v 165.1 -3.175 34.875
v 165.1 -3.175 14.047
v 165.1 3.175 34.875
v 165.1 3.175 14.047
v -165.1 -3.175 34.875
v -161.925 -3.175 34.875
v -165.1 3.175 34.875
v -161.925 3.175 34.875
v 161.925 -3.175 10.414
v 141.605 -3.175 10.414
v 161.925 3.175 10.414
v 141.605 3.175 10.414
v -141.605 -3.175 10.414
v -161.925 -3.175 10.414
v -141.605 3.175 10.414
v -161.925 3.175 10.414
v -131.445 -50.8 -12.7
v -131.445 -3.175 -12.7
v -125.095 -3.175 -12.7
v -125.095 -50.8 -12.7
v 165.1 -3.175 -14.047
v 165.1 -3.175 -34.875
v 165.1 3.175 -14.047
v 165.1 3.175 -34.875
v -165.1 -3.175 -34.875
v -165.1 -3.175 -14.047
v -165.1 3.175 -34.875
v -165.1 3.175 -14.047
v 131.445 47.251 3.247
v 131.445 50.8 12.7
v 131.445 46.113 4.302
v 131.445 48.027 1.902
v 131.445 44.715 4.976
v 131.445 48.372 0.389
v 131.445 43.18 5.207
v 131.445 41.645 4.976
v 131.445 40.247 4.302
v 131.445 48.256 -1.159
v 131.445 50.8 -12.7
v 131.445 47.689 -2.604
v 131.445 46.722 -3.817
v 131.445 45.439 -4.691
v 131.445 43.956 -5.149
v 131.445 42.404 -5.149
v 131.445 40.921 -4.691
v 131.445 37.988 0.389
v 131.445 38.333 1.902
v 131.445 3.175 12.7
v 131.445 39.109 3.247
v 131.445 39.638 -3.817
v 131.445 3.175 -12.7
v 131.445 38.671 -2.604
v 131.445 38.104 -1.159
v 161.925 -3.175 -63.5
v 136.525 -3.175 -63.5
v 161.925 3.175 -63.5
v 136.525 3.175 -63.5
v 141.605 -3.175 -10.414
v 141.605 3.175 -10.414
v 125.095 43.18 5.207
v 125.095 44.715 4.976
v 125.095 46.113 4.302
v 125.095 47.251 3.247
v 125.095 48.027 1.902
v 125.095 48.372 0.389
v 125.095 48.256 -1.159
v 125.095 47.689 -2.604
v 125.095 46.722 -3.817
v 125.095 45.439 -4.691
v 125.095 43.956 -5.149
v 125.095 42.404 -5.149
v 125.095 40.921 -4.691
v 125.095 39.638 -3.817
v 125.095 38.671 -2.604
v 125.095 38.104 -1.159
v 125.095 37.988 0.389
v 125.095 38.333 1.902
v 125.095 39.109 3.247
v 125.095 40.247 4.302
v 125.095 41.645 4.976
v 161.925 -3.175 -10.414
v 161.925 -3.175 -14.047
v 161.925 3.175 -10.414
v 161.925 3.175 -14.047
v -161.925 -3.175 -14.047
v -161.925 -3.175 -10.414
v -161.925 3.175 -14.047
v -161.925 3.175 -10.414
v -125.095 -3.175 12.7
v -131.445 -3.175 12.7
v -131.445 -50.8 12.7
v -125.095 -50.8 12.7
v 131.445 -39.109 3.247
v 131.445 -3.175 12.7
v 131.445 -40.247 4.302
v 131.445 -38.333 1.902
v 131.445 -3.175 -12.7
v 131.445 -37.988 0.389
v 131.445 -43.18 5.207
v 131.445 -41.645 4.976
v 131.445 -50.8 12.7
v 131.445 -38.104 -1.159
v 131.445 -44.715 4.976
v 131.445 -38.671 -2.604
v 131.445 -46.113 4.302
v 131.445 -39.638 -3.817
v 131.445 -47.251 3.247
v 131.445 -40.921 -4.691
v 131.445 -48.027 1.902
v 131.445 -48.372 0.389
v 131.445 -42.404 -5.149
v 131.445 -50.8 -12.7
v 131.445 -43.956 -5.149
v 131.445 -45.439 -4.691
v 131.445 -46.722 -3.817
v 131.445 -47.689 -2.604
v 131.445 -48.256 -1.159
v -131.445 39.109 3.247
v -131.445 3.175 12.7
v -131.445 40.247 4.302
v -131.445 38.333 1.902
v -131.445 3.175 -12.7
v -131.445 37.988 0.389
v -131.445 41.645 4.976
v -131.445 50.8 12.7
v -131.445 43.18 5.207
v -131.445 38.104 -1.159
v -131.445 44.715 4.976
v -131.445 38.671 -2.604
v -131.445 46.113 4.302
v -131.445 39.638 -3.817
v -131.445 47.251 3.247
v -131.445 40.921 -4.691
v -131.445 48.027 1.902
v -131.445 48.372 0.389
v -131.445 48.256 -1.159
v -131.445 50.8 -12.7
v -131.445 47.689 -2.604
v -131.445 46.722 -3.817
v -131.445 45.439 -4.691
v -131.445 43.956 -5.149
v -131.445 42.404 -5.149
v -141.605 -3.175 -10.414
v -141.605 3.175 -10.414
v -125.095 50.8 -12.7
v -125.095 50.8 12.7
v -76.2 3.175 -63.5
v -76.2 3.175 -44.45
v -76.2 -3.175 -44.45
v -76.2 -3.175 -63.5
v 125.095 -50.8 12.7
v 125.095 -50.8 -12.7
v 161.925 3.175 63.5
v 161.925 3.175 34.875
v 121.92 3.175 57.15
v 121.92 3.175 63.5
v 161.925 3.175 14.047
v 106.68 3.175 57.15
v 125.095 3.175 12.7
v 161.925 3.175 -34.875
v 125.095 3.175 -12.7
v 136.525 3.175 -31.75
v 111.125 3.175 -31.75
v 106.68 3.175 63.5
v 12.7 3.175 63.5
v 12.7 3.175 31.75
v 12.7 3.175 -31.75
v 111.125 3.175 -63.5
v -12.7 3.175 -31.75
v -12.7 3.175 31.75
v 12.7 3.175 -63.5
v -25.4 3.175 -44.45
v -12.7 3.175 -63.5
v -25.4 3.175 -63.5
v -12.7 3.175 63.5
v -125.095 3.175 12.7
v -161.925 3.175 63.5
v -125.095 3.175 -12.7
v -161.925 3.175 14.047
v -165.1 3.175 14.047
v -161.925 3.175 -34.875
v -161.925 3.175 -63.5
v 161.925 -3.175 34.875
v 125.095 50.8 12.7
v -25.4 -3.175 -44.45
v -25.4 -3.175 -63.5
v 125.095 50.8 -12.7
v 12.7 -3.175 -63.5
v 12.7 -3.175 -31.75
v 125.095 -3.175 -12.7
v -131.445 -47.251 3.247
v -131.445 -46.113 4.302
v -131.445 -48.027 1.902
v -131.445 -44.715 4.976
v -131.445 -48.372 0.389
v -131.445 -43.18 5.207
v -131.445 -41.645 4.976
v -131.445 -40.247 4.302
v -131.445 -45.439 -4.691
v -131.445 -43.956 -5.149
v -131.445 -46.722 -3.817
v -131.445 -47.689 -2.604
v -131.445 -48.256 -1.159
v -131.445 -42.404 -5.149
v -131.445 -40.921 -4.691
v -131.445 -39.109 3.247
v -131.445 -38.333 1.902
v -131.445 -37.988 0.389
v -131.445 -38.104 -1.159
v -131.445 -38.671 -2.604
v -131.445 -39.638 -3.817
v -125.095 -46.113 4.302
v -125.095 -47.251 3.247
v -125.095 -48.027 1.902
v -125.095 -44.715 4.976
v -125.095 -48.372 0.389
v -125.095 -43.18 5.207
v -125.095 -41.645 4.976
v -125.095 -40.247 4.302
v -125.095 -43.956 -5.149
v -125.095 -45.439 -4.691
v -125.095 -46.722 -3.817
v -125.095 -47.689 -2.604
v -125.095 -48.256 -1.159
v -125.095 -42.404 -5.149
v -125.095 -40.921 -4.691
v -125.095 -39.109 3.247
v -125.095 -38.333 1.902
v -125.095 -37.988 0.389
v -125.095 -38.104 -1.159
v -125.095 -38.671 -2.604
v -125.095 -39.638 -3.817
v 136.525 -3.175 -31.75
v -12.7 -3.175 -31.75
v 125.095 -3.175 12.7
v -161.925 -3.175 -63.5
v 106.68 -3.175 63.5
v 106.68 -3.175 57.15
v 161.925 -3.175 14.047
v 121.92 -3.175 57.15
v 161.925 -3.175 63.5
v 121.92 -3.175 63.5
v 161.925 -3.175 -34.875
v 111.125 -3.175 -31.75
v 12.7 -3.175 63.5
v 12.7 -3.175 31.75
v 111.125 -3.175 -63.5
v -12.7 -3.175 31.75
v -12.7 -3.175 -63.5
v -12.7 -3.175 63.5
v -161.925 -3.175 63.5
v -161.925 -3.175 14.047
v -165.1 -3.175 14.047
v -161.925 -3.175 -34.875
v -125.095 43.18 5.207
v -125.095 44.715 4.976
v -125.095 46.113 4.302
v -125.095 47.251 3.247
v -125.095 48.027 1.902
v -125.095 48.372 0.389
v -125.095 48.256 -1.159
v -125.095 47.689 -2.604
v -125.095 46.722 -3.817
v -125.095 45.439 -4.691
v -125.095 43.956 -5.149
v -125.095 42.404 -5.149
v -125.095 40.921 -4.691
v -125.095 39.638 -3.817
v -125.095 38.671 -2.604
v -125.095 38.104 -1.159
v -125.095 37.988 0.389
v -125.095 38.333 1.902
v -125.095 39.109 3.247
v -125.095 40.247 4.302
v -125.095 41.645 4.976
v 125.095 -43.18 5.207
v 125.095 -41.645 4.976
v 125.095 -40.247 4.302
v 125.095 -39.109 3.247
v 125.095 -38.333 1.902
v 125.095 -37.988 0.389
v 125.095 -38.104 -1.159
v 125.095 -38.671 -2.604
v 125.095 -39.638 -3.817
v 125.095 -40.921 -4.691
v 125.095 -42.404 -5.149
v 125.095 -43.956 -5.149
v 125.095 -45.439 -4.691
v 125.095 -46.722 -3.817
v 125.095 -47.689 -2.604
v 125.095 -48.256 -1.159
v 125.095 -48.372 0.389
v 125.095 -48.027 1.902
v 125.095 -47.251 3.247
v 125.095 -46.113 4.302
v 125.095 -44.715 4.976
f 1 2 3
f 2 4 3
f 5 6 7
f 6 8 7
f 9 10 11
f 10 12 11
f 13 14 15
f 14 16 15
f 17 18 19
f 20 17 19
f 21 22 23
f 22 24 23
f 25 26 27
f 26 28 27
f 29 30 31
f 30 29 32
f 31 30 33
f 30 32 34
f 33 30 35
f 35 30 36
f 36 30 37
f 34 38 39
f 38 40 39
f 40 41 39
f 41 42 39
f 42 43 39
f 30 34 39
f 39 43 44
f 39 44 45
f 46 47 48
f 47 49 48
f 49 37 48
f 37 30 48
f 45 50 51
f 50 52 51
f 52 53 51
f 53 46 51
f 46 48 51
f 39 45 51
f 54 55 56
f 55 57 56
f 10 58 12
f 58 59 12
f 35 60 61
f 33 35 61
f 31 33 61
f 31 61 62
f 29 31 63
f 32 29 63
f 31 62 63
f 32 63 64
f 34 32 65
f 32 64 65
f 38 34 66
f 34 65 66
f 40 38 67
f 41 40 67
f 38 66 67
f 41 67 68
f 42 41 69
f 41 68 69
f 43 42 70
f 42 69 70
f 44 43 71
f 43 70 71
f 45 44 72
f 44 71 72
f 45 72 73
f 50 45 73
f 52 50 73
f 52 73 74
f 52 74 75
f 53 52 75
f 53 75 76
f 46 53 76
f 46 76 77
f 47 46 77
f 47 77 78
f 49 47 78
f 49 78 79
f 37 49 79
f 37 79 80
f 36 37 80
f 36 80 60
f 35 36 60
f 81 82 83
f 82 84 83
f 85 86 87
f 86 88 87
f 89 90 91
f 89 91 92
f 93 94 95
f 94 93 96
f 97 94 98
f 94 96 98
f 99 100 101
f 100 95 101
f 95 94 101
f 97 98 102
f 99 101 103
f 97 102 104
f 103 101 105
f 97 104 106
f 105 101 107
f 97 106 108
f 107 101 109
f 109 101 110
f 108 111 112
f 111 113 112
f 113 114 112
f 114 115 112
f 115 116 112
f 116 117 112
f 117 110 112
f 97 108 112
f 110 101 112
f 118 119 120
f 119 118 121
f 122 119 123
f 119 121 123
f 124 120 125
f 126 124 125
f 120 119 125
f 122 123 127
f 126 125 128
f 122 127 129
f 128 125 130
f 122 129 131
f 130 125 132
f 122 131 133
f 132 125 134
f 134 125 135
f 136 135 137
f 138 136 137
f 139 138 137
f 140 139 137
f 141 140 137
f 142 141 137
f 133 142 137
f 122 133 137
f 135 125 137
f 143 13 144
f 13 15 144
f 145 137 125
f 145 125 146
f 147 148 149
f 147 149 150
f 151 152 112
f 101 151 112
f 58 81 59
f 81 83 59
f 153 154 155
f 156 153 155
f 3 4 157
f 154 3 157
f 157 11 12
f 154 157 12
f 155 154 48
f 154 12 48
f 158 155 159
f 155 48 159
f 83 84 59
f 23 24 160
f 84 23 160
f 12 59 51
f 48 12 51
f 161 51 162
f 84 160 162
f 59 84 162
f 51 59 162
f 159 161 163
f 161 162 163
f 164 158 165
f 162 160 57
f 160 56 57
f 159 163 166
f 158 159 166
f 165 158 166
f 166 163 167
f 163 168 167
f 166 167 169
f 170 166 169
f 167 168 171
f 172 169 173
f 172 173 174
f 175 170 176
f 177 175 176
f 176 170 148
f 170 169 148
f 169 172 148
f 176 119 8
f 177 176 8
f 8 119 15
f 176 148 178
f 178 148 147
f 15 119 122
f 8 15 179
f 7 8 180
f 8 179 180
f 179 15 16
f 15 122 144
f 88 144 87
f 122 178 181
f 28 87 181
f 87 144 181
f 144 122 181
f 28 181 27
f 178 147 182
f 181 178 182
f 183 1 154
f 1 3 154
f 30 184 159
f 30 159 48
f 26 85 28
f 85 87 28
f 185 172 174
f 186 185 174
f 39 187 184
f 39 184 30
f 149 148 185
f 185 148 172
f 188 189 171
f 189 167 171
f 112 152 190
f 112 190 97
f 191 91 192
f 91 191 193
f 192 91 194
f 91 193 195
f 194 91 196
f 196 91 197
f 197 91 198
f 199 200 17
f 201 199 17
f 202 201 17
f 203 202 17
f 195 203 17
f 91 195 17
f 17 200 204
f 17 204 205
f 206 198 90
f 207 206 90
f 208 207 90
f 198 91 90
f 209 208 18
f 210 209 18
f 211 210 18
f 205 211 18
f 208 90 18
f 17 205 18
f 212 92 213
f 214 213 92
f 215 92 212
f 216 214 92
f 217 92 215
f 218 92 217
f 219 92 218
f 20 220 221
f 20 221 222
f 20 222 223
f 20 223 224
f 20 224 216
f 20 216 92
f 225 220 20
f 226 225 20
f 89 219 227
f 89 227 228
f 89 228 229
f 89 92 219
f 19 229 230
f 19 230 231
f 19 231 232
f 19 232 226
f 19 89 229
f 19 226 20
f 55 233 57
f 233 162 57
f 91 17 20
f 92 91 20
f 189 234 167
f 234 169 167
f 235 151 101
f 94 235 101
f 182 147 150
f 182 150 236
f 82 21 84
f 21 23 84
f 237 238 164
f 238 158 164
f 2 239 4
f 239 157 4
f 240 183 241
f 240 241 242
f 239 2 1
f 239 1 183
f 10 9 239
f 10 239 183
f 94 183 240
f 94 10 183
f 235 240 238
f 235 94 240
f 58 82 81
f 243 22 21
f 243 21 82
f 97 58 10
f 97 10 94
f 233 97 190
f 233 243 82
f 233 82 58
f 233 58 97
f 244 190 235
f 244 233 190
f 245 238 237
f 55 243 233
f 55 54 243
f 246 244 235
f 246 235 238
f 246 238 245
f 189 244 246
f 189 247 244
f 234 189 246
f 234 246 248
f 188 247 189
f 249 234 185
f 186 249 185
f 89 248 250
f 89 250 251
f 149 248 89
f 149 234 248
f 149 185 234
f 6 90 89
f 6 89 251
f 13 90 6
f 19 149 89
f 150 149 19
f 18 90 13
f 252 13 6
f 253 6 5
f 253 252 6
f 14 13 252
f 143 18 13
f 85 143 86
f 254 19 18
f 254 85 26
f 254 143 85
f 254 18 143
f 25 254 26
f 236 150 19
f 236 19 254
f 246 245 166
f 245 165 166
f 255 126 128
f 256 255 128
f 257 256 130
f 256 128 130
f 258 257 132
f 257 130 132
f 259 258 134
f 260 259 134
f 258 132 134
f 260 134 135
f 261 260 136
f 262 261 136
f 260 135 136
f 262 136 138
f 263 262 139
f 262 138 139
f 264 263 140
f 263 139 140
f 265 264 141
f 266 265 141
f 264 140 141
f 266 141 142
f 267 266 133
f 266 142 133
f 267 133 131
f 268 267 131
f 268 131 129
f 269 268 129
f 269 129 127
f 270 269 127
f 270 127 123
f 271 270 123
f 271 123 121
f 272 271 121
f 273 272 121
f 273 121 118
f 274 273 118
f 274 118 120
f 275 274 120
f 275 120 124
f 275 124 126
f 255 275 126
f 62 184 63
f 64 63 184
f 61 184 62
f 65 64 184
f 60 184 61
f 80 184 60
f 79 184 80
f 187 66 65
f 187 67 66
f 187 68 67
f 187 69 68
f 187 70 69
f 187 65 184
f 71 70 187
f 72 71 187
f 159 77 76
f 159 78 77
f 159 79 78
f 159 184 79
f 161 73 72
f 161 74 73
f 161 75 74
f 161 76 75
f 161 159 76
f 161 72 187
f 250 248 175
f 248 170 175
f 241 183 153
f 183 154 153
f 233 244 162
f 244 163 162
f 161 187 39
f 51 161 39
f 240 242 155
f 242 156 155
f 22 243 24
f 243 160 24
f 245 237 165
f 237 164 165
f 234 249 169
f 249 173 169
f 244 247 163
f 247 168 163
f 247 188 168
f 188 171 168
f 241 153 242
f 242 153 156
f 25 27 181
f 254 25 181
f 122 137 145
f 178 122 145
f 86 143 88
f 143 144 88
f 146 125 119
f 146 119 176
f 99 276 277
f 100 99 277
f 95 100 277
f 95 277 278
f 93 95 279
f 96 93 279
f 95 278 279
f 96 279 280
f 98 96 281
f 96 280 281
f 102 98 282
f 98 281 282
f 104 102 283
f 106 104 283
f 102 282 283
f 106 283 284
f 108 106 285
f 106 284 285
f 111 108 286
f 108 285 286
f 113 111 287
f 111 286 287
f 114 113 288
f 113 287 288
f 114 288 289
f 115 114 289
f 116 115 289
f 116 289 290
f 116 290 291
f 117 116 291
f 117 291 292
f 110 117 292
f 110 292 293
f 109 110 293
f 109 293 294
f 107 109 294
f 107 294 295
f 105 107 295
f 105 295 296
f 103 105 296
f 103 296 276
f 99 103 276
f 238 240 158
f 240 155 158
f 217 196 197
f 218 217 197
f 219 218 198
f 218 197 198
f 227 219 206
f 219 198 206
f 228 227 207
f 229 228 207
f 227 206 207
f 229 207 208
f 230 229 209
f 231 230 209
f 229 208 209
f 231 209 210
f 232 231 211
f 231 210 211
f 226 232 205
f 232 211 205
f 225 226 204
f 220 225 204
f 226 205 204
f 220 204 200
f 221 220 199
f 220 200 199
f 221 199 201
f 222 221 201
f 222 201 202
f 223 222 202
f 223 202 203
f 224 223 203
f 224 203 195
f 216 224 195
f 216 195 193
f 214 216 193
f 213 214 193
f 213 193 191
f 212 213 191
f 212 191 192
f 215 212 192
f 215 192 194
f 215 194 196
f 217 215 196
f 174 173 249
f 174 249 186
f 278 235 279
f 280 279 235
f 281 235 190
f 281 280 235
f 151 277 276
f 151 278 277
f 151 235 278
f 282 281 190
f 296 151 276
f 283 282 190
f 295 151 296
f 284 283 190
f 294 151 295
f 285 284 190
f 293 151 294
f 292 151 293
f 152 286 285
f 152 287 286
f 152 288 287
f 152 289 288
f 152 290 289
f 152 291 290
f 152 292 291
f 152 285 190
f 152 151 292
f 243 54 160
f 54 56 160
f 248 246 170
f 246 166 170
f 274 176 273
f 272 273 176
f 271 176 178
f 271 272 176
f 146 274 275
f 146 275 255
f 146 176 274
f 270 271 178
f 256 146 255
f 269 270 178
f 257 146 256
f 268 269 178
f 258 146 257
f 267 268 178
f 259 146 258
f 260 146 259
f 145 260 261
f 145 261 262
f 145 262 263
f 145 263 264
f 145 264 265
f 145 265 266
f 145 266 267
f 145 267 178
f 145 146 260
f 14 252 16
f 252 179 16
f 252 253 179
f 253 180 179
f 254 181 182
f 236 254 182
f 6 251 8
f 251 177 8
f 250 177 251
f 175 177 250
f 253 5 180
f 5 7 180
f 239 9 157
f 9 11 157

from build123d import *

# Parameters (mm, degrees)
BOSS_EXTRUDE1_DEPTH     = 3.175
SKETCH2_W               = 6.35
SKETCH2_H               = 25.4
BOSS_EXTRUDE2_DEPTH     = 50.8
SKETCH3_R               = 5.207
CUT_EXTRUDE1_DEPTH      = 34.655
CUT_EXTRUDE1_DEPTH_BACK = 297.545
SKETCH4_W               = 50.8
SKETCH4_H               = 19.05
CUT_EXTRUDE2_DEPTH      = 54.975


with BuildPart() as part:
    # Sketch1 → Boss-Extrude1 (new body, symmetric)
    with BuildSketch(Plane(origin=(0, 0, 0), x_dir=(1, 0, 0), z_dir=(0, 1, 0))):
        Polygon((-136.779, 63.5), (-111.379, 63.5), (-12.7, 63.5), (-12.7, 31.75), (12.7, 31.75), (12.7, 63.5), (111.125, 63.5), (111.125, 31.75), (136.525, 31.75), (136.525, 63.5), (161.925, 63.5), (161.925, 34.874677354), (165.1, 34.874677354), (165.1, 14.046677354), (161.925, 14.046677354), (161.925, 10.414), (141.605, 10.414), (141.605, -10.414), (161.925, -10.414), (161.925, -14.046677354), (165.1, -14.046677354), (165.1, -34.874677354), (161.925, -34.874677354), (161.925, -63.5), (121.92, -63.5), (121.92, -57.15), (106.68, -57.15), (106.68, -63.5), (12.7, -63.5), (12.7, -31.75), (-12.7, -31.75), (-12.7, -63.5), (-106.68, -63.5), (-110.5408, -63.5), (-135.9408, -63.5), (-161.925, -63.5), (-161.925, -34.874677354), (-165.1, -34.874677354), (-165.1, -14.046677354), (-161.925, -14.046677354), (-161.925, -10.414), (-141.605, -10.414), (-141.605, 10.414), (-161.925, 10.414), (-161.925, 14.046677354), (-165.1, 14.046677354), (-165.1, 34.874677354), (-161.925, 34.874677354), (-161.925, 63.5), align=None)
    extrude(amount=BOSS_EXTRUDE1_DEPTH, both=True)

    # Sketch2 → Boss-Extrude2 (add, symmetric)
    with BuildSketch(Plane(origin=(0, 0, 0), x_dir=(1, 0, 0), z_dir=(0, 1, 0))):
        with Locations((128.27, 0)):
            Rectangle(SKETCH2_W, SKETCH2_H)
        with Locations((-128.27, 0)):
            Rectangle(SKETCH2_W, SKETCH2_H)
    extrude(amount=BOSS_EXTRUDE2_DEPTH, both=True)

    # Sketch3 → Cut-Extrude1 (cut, two sides)
    with BuildSketch(Plane.ZY.offset(131.445)) as cut_extrude1_sk:
        with Locations((0, 43.18)):
            Circle(SKETCH3_R)
        with Locations((0, -43.18)):
            Circle(SKETCH3_R)
    extrude(amount=CUT_EXTRUDE1_DEPTH, mode=Mode.SUBTRACT)
    extrude(cut_extrude1_sk.sketch, amount=-CUT_EXTRUDE1_DEPTH_BACK, mode=Mode.SUBTRACT)

    # Sketch4 → Cut-Extrude2 (cut, through all)
    with BuildSketch(Plane(origin=(0, 3.175, 0), x_dir=(1, 0, 0), z_dir=(0, 1, 0))):
        with Locations((-50.8, 53.975)):
            Rectangle(SKETCH4_W, SKETCH4_H)
    extrude(amount=-CUT_EXTRUDE2_DEPTH, mode=Mode.SUBTRACT)


solid = part.part
